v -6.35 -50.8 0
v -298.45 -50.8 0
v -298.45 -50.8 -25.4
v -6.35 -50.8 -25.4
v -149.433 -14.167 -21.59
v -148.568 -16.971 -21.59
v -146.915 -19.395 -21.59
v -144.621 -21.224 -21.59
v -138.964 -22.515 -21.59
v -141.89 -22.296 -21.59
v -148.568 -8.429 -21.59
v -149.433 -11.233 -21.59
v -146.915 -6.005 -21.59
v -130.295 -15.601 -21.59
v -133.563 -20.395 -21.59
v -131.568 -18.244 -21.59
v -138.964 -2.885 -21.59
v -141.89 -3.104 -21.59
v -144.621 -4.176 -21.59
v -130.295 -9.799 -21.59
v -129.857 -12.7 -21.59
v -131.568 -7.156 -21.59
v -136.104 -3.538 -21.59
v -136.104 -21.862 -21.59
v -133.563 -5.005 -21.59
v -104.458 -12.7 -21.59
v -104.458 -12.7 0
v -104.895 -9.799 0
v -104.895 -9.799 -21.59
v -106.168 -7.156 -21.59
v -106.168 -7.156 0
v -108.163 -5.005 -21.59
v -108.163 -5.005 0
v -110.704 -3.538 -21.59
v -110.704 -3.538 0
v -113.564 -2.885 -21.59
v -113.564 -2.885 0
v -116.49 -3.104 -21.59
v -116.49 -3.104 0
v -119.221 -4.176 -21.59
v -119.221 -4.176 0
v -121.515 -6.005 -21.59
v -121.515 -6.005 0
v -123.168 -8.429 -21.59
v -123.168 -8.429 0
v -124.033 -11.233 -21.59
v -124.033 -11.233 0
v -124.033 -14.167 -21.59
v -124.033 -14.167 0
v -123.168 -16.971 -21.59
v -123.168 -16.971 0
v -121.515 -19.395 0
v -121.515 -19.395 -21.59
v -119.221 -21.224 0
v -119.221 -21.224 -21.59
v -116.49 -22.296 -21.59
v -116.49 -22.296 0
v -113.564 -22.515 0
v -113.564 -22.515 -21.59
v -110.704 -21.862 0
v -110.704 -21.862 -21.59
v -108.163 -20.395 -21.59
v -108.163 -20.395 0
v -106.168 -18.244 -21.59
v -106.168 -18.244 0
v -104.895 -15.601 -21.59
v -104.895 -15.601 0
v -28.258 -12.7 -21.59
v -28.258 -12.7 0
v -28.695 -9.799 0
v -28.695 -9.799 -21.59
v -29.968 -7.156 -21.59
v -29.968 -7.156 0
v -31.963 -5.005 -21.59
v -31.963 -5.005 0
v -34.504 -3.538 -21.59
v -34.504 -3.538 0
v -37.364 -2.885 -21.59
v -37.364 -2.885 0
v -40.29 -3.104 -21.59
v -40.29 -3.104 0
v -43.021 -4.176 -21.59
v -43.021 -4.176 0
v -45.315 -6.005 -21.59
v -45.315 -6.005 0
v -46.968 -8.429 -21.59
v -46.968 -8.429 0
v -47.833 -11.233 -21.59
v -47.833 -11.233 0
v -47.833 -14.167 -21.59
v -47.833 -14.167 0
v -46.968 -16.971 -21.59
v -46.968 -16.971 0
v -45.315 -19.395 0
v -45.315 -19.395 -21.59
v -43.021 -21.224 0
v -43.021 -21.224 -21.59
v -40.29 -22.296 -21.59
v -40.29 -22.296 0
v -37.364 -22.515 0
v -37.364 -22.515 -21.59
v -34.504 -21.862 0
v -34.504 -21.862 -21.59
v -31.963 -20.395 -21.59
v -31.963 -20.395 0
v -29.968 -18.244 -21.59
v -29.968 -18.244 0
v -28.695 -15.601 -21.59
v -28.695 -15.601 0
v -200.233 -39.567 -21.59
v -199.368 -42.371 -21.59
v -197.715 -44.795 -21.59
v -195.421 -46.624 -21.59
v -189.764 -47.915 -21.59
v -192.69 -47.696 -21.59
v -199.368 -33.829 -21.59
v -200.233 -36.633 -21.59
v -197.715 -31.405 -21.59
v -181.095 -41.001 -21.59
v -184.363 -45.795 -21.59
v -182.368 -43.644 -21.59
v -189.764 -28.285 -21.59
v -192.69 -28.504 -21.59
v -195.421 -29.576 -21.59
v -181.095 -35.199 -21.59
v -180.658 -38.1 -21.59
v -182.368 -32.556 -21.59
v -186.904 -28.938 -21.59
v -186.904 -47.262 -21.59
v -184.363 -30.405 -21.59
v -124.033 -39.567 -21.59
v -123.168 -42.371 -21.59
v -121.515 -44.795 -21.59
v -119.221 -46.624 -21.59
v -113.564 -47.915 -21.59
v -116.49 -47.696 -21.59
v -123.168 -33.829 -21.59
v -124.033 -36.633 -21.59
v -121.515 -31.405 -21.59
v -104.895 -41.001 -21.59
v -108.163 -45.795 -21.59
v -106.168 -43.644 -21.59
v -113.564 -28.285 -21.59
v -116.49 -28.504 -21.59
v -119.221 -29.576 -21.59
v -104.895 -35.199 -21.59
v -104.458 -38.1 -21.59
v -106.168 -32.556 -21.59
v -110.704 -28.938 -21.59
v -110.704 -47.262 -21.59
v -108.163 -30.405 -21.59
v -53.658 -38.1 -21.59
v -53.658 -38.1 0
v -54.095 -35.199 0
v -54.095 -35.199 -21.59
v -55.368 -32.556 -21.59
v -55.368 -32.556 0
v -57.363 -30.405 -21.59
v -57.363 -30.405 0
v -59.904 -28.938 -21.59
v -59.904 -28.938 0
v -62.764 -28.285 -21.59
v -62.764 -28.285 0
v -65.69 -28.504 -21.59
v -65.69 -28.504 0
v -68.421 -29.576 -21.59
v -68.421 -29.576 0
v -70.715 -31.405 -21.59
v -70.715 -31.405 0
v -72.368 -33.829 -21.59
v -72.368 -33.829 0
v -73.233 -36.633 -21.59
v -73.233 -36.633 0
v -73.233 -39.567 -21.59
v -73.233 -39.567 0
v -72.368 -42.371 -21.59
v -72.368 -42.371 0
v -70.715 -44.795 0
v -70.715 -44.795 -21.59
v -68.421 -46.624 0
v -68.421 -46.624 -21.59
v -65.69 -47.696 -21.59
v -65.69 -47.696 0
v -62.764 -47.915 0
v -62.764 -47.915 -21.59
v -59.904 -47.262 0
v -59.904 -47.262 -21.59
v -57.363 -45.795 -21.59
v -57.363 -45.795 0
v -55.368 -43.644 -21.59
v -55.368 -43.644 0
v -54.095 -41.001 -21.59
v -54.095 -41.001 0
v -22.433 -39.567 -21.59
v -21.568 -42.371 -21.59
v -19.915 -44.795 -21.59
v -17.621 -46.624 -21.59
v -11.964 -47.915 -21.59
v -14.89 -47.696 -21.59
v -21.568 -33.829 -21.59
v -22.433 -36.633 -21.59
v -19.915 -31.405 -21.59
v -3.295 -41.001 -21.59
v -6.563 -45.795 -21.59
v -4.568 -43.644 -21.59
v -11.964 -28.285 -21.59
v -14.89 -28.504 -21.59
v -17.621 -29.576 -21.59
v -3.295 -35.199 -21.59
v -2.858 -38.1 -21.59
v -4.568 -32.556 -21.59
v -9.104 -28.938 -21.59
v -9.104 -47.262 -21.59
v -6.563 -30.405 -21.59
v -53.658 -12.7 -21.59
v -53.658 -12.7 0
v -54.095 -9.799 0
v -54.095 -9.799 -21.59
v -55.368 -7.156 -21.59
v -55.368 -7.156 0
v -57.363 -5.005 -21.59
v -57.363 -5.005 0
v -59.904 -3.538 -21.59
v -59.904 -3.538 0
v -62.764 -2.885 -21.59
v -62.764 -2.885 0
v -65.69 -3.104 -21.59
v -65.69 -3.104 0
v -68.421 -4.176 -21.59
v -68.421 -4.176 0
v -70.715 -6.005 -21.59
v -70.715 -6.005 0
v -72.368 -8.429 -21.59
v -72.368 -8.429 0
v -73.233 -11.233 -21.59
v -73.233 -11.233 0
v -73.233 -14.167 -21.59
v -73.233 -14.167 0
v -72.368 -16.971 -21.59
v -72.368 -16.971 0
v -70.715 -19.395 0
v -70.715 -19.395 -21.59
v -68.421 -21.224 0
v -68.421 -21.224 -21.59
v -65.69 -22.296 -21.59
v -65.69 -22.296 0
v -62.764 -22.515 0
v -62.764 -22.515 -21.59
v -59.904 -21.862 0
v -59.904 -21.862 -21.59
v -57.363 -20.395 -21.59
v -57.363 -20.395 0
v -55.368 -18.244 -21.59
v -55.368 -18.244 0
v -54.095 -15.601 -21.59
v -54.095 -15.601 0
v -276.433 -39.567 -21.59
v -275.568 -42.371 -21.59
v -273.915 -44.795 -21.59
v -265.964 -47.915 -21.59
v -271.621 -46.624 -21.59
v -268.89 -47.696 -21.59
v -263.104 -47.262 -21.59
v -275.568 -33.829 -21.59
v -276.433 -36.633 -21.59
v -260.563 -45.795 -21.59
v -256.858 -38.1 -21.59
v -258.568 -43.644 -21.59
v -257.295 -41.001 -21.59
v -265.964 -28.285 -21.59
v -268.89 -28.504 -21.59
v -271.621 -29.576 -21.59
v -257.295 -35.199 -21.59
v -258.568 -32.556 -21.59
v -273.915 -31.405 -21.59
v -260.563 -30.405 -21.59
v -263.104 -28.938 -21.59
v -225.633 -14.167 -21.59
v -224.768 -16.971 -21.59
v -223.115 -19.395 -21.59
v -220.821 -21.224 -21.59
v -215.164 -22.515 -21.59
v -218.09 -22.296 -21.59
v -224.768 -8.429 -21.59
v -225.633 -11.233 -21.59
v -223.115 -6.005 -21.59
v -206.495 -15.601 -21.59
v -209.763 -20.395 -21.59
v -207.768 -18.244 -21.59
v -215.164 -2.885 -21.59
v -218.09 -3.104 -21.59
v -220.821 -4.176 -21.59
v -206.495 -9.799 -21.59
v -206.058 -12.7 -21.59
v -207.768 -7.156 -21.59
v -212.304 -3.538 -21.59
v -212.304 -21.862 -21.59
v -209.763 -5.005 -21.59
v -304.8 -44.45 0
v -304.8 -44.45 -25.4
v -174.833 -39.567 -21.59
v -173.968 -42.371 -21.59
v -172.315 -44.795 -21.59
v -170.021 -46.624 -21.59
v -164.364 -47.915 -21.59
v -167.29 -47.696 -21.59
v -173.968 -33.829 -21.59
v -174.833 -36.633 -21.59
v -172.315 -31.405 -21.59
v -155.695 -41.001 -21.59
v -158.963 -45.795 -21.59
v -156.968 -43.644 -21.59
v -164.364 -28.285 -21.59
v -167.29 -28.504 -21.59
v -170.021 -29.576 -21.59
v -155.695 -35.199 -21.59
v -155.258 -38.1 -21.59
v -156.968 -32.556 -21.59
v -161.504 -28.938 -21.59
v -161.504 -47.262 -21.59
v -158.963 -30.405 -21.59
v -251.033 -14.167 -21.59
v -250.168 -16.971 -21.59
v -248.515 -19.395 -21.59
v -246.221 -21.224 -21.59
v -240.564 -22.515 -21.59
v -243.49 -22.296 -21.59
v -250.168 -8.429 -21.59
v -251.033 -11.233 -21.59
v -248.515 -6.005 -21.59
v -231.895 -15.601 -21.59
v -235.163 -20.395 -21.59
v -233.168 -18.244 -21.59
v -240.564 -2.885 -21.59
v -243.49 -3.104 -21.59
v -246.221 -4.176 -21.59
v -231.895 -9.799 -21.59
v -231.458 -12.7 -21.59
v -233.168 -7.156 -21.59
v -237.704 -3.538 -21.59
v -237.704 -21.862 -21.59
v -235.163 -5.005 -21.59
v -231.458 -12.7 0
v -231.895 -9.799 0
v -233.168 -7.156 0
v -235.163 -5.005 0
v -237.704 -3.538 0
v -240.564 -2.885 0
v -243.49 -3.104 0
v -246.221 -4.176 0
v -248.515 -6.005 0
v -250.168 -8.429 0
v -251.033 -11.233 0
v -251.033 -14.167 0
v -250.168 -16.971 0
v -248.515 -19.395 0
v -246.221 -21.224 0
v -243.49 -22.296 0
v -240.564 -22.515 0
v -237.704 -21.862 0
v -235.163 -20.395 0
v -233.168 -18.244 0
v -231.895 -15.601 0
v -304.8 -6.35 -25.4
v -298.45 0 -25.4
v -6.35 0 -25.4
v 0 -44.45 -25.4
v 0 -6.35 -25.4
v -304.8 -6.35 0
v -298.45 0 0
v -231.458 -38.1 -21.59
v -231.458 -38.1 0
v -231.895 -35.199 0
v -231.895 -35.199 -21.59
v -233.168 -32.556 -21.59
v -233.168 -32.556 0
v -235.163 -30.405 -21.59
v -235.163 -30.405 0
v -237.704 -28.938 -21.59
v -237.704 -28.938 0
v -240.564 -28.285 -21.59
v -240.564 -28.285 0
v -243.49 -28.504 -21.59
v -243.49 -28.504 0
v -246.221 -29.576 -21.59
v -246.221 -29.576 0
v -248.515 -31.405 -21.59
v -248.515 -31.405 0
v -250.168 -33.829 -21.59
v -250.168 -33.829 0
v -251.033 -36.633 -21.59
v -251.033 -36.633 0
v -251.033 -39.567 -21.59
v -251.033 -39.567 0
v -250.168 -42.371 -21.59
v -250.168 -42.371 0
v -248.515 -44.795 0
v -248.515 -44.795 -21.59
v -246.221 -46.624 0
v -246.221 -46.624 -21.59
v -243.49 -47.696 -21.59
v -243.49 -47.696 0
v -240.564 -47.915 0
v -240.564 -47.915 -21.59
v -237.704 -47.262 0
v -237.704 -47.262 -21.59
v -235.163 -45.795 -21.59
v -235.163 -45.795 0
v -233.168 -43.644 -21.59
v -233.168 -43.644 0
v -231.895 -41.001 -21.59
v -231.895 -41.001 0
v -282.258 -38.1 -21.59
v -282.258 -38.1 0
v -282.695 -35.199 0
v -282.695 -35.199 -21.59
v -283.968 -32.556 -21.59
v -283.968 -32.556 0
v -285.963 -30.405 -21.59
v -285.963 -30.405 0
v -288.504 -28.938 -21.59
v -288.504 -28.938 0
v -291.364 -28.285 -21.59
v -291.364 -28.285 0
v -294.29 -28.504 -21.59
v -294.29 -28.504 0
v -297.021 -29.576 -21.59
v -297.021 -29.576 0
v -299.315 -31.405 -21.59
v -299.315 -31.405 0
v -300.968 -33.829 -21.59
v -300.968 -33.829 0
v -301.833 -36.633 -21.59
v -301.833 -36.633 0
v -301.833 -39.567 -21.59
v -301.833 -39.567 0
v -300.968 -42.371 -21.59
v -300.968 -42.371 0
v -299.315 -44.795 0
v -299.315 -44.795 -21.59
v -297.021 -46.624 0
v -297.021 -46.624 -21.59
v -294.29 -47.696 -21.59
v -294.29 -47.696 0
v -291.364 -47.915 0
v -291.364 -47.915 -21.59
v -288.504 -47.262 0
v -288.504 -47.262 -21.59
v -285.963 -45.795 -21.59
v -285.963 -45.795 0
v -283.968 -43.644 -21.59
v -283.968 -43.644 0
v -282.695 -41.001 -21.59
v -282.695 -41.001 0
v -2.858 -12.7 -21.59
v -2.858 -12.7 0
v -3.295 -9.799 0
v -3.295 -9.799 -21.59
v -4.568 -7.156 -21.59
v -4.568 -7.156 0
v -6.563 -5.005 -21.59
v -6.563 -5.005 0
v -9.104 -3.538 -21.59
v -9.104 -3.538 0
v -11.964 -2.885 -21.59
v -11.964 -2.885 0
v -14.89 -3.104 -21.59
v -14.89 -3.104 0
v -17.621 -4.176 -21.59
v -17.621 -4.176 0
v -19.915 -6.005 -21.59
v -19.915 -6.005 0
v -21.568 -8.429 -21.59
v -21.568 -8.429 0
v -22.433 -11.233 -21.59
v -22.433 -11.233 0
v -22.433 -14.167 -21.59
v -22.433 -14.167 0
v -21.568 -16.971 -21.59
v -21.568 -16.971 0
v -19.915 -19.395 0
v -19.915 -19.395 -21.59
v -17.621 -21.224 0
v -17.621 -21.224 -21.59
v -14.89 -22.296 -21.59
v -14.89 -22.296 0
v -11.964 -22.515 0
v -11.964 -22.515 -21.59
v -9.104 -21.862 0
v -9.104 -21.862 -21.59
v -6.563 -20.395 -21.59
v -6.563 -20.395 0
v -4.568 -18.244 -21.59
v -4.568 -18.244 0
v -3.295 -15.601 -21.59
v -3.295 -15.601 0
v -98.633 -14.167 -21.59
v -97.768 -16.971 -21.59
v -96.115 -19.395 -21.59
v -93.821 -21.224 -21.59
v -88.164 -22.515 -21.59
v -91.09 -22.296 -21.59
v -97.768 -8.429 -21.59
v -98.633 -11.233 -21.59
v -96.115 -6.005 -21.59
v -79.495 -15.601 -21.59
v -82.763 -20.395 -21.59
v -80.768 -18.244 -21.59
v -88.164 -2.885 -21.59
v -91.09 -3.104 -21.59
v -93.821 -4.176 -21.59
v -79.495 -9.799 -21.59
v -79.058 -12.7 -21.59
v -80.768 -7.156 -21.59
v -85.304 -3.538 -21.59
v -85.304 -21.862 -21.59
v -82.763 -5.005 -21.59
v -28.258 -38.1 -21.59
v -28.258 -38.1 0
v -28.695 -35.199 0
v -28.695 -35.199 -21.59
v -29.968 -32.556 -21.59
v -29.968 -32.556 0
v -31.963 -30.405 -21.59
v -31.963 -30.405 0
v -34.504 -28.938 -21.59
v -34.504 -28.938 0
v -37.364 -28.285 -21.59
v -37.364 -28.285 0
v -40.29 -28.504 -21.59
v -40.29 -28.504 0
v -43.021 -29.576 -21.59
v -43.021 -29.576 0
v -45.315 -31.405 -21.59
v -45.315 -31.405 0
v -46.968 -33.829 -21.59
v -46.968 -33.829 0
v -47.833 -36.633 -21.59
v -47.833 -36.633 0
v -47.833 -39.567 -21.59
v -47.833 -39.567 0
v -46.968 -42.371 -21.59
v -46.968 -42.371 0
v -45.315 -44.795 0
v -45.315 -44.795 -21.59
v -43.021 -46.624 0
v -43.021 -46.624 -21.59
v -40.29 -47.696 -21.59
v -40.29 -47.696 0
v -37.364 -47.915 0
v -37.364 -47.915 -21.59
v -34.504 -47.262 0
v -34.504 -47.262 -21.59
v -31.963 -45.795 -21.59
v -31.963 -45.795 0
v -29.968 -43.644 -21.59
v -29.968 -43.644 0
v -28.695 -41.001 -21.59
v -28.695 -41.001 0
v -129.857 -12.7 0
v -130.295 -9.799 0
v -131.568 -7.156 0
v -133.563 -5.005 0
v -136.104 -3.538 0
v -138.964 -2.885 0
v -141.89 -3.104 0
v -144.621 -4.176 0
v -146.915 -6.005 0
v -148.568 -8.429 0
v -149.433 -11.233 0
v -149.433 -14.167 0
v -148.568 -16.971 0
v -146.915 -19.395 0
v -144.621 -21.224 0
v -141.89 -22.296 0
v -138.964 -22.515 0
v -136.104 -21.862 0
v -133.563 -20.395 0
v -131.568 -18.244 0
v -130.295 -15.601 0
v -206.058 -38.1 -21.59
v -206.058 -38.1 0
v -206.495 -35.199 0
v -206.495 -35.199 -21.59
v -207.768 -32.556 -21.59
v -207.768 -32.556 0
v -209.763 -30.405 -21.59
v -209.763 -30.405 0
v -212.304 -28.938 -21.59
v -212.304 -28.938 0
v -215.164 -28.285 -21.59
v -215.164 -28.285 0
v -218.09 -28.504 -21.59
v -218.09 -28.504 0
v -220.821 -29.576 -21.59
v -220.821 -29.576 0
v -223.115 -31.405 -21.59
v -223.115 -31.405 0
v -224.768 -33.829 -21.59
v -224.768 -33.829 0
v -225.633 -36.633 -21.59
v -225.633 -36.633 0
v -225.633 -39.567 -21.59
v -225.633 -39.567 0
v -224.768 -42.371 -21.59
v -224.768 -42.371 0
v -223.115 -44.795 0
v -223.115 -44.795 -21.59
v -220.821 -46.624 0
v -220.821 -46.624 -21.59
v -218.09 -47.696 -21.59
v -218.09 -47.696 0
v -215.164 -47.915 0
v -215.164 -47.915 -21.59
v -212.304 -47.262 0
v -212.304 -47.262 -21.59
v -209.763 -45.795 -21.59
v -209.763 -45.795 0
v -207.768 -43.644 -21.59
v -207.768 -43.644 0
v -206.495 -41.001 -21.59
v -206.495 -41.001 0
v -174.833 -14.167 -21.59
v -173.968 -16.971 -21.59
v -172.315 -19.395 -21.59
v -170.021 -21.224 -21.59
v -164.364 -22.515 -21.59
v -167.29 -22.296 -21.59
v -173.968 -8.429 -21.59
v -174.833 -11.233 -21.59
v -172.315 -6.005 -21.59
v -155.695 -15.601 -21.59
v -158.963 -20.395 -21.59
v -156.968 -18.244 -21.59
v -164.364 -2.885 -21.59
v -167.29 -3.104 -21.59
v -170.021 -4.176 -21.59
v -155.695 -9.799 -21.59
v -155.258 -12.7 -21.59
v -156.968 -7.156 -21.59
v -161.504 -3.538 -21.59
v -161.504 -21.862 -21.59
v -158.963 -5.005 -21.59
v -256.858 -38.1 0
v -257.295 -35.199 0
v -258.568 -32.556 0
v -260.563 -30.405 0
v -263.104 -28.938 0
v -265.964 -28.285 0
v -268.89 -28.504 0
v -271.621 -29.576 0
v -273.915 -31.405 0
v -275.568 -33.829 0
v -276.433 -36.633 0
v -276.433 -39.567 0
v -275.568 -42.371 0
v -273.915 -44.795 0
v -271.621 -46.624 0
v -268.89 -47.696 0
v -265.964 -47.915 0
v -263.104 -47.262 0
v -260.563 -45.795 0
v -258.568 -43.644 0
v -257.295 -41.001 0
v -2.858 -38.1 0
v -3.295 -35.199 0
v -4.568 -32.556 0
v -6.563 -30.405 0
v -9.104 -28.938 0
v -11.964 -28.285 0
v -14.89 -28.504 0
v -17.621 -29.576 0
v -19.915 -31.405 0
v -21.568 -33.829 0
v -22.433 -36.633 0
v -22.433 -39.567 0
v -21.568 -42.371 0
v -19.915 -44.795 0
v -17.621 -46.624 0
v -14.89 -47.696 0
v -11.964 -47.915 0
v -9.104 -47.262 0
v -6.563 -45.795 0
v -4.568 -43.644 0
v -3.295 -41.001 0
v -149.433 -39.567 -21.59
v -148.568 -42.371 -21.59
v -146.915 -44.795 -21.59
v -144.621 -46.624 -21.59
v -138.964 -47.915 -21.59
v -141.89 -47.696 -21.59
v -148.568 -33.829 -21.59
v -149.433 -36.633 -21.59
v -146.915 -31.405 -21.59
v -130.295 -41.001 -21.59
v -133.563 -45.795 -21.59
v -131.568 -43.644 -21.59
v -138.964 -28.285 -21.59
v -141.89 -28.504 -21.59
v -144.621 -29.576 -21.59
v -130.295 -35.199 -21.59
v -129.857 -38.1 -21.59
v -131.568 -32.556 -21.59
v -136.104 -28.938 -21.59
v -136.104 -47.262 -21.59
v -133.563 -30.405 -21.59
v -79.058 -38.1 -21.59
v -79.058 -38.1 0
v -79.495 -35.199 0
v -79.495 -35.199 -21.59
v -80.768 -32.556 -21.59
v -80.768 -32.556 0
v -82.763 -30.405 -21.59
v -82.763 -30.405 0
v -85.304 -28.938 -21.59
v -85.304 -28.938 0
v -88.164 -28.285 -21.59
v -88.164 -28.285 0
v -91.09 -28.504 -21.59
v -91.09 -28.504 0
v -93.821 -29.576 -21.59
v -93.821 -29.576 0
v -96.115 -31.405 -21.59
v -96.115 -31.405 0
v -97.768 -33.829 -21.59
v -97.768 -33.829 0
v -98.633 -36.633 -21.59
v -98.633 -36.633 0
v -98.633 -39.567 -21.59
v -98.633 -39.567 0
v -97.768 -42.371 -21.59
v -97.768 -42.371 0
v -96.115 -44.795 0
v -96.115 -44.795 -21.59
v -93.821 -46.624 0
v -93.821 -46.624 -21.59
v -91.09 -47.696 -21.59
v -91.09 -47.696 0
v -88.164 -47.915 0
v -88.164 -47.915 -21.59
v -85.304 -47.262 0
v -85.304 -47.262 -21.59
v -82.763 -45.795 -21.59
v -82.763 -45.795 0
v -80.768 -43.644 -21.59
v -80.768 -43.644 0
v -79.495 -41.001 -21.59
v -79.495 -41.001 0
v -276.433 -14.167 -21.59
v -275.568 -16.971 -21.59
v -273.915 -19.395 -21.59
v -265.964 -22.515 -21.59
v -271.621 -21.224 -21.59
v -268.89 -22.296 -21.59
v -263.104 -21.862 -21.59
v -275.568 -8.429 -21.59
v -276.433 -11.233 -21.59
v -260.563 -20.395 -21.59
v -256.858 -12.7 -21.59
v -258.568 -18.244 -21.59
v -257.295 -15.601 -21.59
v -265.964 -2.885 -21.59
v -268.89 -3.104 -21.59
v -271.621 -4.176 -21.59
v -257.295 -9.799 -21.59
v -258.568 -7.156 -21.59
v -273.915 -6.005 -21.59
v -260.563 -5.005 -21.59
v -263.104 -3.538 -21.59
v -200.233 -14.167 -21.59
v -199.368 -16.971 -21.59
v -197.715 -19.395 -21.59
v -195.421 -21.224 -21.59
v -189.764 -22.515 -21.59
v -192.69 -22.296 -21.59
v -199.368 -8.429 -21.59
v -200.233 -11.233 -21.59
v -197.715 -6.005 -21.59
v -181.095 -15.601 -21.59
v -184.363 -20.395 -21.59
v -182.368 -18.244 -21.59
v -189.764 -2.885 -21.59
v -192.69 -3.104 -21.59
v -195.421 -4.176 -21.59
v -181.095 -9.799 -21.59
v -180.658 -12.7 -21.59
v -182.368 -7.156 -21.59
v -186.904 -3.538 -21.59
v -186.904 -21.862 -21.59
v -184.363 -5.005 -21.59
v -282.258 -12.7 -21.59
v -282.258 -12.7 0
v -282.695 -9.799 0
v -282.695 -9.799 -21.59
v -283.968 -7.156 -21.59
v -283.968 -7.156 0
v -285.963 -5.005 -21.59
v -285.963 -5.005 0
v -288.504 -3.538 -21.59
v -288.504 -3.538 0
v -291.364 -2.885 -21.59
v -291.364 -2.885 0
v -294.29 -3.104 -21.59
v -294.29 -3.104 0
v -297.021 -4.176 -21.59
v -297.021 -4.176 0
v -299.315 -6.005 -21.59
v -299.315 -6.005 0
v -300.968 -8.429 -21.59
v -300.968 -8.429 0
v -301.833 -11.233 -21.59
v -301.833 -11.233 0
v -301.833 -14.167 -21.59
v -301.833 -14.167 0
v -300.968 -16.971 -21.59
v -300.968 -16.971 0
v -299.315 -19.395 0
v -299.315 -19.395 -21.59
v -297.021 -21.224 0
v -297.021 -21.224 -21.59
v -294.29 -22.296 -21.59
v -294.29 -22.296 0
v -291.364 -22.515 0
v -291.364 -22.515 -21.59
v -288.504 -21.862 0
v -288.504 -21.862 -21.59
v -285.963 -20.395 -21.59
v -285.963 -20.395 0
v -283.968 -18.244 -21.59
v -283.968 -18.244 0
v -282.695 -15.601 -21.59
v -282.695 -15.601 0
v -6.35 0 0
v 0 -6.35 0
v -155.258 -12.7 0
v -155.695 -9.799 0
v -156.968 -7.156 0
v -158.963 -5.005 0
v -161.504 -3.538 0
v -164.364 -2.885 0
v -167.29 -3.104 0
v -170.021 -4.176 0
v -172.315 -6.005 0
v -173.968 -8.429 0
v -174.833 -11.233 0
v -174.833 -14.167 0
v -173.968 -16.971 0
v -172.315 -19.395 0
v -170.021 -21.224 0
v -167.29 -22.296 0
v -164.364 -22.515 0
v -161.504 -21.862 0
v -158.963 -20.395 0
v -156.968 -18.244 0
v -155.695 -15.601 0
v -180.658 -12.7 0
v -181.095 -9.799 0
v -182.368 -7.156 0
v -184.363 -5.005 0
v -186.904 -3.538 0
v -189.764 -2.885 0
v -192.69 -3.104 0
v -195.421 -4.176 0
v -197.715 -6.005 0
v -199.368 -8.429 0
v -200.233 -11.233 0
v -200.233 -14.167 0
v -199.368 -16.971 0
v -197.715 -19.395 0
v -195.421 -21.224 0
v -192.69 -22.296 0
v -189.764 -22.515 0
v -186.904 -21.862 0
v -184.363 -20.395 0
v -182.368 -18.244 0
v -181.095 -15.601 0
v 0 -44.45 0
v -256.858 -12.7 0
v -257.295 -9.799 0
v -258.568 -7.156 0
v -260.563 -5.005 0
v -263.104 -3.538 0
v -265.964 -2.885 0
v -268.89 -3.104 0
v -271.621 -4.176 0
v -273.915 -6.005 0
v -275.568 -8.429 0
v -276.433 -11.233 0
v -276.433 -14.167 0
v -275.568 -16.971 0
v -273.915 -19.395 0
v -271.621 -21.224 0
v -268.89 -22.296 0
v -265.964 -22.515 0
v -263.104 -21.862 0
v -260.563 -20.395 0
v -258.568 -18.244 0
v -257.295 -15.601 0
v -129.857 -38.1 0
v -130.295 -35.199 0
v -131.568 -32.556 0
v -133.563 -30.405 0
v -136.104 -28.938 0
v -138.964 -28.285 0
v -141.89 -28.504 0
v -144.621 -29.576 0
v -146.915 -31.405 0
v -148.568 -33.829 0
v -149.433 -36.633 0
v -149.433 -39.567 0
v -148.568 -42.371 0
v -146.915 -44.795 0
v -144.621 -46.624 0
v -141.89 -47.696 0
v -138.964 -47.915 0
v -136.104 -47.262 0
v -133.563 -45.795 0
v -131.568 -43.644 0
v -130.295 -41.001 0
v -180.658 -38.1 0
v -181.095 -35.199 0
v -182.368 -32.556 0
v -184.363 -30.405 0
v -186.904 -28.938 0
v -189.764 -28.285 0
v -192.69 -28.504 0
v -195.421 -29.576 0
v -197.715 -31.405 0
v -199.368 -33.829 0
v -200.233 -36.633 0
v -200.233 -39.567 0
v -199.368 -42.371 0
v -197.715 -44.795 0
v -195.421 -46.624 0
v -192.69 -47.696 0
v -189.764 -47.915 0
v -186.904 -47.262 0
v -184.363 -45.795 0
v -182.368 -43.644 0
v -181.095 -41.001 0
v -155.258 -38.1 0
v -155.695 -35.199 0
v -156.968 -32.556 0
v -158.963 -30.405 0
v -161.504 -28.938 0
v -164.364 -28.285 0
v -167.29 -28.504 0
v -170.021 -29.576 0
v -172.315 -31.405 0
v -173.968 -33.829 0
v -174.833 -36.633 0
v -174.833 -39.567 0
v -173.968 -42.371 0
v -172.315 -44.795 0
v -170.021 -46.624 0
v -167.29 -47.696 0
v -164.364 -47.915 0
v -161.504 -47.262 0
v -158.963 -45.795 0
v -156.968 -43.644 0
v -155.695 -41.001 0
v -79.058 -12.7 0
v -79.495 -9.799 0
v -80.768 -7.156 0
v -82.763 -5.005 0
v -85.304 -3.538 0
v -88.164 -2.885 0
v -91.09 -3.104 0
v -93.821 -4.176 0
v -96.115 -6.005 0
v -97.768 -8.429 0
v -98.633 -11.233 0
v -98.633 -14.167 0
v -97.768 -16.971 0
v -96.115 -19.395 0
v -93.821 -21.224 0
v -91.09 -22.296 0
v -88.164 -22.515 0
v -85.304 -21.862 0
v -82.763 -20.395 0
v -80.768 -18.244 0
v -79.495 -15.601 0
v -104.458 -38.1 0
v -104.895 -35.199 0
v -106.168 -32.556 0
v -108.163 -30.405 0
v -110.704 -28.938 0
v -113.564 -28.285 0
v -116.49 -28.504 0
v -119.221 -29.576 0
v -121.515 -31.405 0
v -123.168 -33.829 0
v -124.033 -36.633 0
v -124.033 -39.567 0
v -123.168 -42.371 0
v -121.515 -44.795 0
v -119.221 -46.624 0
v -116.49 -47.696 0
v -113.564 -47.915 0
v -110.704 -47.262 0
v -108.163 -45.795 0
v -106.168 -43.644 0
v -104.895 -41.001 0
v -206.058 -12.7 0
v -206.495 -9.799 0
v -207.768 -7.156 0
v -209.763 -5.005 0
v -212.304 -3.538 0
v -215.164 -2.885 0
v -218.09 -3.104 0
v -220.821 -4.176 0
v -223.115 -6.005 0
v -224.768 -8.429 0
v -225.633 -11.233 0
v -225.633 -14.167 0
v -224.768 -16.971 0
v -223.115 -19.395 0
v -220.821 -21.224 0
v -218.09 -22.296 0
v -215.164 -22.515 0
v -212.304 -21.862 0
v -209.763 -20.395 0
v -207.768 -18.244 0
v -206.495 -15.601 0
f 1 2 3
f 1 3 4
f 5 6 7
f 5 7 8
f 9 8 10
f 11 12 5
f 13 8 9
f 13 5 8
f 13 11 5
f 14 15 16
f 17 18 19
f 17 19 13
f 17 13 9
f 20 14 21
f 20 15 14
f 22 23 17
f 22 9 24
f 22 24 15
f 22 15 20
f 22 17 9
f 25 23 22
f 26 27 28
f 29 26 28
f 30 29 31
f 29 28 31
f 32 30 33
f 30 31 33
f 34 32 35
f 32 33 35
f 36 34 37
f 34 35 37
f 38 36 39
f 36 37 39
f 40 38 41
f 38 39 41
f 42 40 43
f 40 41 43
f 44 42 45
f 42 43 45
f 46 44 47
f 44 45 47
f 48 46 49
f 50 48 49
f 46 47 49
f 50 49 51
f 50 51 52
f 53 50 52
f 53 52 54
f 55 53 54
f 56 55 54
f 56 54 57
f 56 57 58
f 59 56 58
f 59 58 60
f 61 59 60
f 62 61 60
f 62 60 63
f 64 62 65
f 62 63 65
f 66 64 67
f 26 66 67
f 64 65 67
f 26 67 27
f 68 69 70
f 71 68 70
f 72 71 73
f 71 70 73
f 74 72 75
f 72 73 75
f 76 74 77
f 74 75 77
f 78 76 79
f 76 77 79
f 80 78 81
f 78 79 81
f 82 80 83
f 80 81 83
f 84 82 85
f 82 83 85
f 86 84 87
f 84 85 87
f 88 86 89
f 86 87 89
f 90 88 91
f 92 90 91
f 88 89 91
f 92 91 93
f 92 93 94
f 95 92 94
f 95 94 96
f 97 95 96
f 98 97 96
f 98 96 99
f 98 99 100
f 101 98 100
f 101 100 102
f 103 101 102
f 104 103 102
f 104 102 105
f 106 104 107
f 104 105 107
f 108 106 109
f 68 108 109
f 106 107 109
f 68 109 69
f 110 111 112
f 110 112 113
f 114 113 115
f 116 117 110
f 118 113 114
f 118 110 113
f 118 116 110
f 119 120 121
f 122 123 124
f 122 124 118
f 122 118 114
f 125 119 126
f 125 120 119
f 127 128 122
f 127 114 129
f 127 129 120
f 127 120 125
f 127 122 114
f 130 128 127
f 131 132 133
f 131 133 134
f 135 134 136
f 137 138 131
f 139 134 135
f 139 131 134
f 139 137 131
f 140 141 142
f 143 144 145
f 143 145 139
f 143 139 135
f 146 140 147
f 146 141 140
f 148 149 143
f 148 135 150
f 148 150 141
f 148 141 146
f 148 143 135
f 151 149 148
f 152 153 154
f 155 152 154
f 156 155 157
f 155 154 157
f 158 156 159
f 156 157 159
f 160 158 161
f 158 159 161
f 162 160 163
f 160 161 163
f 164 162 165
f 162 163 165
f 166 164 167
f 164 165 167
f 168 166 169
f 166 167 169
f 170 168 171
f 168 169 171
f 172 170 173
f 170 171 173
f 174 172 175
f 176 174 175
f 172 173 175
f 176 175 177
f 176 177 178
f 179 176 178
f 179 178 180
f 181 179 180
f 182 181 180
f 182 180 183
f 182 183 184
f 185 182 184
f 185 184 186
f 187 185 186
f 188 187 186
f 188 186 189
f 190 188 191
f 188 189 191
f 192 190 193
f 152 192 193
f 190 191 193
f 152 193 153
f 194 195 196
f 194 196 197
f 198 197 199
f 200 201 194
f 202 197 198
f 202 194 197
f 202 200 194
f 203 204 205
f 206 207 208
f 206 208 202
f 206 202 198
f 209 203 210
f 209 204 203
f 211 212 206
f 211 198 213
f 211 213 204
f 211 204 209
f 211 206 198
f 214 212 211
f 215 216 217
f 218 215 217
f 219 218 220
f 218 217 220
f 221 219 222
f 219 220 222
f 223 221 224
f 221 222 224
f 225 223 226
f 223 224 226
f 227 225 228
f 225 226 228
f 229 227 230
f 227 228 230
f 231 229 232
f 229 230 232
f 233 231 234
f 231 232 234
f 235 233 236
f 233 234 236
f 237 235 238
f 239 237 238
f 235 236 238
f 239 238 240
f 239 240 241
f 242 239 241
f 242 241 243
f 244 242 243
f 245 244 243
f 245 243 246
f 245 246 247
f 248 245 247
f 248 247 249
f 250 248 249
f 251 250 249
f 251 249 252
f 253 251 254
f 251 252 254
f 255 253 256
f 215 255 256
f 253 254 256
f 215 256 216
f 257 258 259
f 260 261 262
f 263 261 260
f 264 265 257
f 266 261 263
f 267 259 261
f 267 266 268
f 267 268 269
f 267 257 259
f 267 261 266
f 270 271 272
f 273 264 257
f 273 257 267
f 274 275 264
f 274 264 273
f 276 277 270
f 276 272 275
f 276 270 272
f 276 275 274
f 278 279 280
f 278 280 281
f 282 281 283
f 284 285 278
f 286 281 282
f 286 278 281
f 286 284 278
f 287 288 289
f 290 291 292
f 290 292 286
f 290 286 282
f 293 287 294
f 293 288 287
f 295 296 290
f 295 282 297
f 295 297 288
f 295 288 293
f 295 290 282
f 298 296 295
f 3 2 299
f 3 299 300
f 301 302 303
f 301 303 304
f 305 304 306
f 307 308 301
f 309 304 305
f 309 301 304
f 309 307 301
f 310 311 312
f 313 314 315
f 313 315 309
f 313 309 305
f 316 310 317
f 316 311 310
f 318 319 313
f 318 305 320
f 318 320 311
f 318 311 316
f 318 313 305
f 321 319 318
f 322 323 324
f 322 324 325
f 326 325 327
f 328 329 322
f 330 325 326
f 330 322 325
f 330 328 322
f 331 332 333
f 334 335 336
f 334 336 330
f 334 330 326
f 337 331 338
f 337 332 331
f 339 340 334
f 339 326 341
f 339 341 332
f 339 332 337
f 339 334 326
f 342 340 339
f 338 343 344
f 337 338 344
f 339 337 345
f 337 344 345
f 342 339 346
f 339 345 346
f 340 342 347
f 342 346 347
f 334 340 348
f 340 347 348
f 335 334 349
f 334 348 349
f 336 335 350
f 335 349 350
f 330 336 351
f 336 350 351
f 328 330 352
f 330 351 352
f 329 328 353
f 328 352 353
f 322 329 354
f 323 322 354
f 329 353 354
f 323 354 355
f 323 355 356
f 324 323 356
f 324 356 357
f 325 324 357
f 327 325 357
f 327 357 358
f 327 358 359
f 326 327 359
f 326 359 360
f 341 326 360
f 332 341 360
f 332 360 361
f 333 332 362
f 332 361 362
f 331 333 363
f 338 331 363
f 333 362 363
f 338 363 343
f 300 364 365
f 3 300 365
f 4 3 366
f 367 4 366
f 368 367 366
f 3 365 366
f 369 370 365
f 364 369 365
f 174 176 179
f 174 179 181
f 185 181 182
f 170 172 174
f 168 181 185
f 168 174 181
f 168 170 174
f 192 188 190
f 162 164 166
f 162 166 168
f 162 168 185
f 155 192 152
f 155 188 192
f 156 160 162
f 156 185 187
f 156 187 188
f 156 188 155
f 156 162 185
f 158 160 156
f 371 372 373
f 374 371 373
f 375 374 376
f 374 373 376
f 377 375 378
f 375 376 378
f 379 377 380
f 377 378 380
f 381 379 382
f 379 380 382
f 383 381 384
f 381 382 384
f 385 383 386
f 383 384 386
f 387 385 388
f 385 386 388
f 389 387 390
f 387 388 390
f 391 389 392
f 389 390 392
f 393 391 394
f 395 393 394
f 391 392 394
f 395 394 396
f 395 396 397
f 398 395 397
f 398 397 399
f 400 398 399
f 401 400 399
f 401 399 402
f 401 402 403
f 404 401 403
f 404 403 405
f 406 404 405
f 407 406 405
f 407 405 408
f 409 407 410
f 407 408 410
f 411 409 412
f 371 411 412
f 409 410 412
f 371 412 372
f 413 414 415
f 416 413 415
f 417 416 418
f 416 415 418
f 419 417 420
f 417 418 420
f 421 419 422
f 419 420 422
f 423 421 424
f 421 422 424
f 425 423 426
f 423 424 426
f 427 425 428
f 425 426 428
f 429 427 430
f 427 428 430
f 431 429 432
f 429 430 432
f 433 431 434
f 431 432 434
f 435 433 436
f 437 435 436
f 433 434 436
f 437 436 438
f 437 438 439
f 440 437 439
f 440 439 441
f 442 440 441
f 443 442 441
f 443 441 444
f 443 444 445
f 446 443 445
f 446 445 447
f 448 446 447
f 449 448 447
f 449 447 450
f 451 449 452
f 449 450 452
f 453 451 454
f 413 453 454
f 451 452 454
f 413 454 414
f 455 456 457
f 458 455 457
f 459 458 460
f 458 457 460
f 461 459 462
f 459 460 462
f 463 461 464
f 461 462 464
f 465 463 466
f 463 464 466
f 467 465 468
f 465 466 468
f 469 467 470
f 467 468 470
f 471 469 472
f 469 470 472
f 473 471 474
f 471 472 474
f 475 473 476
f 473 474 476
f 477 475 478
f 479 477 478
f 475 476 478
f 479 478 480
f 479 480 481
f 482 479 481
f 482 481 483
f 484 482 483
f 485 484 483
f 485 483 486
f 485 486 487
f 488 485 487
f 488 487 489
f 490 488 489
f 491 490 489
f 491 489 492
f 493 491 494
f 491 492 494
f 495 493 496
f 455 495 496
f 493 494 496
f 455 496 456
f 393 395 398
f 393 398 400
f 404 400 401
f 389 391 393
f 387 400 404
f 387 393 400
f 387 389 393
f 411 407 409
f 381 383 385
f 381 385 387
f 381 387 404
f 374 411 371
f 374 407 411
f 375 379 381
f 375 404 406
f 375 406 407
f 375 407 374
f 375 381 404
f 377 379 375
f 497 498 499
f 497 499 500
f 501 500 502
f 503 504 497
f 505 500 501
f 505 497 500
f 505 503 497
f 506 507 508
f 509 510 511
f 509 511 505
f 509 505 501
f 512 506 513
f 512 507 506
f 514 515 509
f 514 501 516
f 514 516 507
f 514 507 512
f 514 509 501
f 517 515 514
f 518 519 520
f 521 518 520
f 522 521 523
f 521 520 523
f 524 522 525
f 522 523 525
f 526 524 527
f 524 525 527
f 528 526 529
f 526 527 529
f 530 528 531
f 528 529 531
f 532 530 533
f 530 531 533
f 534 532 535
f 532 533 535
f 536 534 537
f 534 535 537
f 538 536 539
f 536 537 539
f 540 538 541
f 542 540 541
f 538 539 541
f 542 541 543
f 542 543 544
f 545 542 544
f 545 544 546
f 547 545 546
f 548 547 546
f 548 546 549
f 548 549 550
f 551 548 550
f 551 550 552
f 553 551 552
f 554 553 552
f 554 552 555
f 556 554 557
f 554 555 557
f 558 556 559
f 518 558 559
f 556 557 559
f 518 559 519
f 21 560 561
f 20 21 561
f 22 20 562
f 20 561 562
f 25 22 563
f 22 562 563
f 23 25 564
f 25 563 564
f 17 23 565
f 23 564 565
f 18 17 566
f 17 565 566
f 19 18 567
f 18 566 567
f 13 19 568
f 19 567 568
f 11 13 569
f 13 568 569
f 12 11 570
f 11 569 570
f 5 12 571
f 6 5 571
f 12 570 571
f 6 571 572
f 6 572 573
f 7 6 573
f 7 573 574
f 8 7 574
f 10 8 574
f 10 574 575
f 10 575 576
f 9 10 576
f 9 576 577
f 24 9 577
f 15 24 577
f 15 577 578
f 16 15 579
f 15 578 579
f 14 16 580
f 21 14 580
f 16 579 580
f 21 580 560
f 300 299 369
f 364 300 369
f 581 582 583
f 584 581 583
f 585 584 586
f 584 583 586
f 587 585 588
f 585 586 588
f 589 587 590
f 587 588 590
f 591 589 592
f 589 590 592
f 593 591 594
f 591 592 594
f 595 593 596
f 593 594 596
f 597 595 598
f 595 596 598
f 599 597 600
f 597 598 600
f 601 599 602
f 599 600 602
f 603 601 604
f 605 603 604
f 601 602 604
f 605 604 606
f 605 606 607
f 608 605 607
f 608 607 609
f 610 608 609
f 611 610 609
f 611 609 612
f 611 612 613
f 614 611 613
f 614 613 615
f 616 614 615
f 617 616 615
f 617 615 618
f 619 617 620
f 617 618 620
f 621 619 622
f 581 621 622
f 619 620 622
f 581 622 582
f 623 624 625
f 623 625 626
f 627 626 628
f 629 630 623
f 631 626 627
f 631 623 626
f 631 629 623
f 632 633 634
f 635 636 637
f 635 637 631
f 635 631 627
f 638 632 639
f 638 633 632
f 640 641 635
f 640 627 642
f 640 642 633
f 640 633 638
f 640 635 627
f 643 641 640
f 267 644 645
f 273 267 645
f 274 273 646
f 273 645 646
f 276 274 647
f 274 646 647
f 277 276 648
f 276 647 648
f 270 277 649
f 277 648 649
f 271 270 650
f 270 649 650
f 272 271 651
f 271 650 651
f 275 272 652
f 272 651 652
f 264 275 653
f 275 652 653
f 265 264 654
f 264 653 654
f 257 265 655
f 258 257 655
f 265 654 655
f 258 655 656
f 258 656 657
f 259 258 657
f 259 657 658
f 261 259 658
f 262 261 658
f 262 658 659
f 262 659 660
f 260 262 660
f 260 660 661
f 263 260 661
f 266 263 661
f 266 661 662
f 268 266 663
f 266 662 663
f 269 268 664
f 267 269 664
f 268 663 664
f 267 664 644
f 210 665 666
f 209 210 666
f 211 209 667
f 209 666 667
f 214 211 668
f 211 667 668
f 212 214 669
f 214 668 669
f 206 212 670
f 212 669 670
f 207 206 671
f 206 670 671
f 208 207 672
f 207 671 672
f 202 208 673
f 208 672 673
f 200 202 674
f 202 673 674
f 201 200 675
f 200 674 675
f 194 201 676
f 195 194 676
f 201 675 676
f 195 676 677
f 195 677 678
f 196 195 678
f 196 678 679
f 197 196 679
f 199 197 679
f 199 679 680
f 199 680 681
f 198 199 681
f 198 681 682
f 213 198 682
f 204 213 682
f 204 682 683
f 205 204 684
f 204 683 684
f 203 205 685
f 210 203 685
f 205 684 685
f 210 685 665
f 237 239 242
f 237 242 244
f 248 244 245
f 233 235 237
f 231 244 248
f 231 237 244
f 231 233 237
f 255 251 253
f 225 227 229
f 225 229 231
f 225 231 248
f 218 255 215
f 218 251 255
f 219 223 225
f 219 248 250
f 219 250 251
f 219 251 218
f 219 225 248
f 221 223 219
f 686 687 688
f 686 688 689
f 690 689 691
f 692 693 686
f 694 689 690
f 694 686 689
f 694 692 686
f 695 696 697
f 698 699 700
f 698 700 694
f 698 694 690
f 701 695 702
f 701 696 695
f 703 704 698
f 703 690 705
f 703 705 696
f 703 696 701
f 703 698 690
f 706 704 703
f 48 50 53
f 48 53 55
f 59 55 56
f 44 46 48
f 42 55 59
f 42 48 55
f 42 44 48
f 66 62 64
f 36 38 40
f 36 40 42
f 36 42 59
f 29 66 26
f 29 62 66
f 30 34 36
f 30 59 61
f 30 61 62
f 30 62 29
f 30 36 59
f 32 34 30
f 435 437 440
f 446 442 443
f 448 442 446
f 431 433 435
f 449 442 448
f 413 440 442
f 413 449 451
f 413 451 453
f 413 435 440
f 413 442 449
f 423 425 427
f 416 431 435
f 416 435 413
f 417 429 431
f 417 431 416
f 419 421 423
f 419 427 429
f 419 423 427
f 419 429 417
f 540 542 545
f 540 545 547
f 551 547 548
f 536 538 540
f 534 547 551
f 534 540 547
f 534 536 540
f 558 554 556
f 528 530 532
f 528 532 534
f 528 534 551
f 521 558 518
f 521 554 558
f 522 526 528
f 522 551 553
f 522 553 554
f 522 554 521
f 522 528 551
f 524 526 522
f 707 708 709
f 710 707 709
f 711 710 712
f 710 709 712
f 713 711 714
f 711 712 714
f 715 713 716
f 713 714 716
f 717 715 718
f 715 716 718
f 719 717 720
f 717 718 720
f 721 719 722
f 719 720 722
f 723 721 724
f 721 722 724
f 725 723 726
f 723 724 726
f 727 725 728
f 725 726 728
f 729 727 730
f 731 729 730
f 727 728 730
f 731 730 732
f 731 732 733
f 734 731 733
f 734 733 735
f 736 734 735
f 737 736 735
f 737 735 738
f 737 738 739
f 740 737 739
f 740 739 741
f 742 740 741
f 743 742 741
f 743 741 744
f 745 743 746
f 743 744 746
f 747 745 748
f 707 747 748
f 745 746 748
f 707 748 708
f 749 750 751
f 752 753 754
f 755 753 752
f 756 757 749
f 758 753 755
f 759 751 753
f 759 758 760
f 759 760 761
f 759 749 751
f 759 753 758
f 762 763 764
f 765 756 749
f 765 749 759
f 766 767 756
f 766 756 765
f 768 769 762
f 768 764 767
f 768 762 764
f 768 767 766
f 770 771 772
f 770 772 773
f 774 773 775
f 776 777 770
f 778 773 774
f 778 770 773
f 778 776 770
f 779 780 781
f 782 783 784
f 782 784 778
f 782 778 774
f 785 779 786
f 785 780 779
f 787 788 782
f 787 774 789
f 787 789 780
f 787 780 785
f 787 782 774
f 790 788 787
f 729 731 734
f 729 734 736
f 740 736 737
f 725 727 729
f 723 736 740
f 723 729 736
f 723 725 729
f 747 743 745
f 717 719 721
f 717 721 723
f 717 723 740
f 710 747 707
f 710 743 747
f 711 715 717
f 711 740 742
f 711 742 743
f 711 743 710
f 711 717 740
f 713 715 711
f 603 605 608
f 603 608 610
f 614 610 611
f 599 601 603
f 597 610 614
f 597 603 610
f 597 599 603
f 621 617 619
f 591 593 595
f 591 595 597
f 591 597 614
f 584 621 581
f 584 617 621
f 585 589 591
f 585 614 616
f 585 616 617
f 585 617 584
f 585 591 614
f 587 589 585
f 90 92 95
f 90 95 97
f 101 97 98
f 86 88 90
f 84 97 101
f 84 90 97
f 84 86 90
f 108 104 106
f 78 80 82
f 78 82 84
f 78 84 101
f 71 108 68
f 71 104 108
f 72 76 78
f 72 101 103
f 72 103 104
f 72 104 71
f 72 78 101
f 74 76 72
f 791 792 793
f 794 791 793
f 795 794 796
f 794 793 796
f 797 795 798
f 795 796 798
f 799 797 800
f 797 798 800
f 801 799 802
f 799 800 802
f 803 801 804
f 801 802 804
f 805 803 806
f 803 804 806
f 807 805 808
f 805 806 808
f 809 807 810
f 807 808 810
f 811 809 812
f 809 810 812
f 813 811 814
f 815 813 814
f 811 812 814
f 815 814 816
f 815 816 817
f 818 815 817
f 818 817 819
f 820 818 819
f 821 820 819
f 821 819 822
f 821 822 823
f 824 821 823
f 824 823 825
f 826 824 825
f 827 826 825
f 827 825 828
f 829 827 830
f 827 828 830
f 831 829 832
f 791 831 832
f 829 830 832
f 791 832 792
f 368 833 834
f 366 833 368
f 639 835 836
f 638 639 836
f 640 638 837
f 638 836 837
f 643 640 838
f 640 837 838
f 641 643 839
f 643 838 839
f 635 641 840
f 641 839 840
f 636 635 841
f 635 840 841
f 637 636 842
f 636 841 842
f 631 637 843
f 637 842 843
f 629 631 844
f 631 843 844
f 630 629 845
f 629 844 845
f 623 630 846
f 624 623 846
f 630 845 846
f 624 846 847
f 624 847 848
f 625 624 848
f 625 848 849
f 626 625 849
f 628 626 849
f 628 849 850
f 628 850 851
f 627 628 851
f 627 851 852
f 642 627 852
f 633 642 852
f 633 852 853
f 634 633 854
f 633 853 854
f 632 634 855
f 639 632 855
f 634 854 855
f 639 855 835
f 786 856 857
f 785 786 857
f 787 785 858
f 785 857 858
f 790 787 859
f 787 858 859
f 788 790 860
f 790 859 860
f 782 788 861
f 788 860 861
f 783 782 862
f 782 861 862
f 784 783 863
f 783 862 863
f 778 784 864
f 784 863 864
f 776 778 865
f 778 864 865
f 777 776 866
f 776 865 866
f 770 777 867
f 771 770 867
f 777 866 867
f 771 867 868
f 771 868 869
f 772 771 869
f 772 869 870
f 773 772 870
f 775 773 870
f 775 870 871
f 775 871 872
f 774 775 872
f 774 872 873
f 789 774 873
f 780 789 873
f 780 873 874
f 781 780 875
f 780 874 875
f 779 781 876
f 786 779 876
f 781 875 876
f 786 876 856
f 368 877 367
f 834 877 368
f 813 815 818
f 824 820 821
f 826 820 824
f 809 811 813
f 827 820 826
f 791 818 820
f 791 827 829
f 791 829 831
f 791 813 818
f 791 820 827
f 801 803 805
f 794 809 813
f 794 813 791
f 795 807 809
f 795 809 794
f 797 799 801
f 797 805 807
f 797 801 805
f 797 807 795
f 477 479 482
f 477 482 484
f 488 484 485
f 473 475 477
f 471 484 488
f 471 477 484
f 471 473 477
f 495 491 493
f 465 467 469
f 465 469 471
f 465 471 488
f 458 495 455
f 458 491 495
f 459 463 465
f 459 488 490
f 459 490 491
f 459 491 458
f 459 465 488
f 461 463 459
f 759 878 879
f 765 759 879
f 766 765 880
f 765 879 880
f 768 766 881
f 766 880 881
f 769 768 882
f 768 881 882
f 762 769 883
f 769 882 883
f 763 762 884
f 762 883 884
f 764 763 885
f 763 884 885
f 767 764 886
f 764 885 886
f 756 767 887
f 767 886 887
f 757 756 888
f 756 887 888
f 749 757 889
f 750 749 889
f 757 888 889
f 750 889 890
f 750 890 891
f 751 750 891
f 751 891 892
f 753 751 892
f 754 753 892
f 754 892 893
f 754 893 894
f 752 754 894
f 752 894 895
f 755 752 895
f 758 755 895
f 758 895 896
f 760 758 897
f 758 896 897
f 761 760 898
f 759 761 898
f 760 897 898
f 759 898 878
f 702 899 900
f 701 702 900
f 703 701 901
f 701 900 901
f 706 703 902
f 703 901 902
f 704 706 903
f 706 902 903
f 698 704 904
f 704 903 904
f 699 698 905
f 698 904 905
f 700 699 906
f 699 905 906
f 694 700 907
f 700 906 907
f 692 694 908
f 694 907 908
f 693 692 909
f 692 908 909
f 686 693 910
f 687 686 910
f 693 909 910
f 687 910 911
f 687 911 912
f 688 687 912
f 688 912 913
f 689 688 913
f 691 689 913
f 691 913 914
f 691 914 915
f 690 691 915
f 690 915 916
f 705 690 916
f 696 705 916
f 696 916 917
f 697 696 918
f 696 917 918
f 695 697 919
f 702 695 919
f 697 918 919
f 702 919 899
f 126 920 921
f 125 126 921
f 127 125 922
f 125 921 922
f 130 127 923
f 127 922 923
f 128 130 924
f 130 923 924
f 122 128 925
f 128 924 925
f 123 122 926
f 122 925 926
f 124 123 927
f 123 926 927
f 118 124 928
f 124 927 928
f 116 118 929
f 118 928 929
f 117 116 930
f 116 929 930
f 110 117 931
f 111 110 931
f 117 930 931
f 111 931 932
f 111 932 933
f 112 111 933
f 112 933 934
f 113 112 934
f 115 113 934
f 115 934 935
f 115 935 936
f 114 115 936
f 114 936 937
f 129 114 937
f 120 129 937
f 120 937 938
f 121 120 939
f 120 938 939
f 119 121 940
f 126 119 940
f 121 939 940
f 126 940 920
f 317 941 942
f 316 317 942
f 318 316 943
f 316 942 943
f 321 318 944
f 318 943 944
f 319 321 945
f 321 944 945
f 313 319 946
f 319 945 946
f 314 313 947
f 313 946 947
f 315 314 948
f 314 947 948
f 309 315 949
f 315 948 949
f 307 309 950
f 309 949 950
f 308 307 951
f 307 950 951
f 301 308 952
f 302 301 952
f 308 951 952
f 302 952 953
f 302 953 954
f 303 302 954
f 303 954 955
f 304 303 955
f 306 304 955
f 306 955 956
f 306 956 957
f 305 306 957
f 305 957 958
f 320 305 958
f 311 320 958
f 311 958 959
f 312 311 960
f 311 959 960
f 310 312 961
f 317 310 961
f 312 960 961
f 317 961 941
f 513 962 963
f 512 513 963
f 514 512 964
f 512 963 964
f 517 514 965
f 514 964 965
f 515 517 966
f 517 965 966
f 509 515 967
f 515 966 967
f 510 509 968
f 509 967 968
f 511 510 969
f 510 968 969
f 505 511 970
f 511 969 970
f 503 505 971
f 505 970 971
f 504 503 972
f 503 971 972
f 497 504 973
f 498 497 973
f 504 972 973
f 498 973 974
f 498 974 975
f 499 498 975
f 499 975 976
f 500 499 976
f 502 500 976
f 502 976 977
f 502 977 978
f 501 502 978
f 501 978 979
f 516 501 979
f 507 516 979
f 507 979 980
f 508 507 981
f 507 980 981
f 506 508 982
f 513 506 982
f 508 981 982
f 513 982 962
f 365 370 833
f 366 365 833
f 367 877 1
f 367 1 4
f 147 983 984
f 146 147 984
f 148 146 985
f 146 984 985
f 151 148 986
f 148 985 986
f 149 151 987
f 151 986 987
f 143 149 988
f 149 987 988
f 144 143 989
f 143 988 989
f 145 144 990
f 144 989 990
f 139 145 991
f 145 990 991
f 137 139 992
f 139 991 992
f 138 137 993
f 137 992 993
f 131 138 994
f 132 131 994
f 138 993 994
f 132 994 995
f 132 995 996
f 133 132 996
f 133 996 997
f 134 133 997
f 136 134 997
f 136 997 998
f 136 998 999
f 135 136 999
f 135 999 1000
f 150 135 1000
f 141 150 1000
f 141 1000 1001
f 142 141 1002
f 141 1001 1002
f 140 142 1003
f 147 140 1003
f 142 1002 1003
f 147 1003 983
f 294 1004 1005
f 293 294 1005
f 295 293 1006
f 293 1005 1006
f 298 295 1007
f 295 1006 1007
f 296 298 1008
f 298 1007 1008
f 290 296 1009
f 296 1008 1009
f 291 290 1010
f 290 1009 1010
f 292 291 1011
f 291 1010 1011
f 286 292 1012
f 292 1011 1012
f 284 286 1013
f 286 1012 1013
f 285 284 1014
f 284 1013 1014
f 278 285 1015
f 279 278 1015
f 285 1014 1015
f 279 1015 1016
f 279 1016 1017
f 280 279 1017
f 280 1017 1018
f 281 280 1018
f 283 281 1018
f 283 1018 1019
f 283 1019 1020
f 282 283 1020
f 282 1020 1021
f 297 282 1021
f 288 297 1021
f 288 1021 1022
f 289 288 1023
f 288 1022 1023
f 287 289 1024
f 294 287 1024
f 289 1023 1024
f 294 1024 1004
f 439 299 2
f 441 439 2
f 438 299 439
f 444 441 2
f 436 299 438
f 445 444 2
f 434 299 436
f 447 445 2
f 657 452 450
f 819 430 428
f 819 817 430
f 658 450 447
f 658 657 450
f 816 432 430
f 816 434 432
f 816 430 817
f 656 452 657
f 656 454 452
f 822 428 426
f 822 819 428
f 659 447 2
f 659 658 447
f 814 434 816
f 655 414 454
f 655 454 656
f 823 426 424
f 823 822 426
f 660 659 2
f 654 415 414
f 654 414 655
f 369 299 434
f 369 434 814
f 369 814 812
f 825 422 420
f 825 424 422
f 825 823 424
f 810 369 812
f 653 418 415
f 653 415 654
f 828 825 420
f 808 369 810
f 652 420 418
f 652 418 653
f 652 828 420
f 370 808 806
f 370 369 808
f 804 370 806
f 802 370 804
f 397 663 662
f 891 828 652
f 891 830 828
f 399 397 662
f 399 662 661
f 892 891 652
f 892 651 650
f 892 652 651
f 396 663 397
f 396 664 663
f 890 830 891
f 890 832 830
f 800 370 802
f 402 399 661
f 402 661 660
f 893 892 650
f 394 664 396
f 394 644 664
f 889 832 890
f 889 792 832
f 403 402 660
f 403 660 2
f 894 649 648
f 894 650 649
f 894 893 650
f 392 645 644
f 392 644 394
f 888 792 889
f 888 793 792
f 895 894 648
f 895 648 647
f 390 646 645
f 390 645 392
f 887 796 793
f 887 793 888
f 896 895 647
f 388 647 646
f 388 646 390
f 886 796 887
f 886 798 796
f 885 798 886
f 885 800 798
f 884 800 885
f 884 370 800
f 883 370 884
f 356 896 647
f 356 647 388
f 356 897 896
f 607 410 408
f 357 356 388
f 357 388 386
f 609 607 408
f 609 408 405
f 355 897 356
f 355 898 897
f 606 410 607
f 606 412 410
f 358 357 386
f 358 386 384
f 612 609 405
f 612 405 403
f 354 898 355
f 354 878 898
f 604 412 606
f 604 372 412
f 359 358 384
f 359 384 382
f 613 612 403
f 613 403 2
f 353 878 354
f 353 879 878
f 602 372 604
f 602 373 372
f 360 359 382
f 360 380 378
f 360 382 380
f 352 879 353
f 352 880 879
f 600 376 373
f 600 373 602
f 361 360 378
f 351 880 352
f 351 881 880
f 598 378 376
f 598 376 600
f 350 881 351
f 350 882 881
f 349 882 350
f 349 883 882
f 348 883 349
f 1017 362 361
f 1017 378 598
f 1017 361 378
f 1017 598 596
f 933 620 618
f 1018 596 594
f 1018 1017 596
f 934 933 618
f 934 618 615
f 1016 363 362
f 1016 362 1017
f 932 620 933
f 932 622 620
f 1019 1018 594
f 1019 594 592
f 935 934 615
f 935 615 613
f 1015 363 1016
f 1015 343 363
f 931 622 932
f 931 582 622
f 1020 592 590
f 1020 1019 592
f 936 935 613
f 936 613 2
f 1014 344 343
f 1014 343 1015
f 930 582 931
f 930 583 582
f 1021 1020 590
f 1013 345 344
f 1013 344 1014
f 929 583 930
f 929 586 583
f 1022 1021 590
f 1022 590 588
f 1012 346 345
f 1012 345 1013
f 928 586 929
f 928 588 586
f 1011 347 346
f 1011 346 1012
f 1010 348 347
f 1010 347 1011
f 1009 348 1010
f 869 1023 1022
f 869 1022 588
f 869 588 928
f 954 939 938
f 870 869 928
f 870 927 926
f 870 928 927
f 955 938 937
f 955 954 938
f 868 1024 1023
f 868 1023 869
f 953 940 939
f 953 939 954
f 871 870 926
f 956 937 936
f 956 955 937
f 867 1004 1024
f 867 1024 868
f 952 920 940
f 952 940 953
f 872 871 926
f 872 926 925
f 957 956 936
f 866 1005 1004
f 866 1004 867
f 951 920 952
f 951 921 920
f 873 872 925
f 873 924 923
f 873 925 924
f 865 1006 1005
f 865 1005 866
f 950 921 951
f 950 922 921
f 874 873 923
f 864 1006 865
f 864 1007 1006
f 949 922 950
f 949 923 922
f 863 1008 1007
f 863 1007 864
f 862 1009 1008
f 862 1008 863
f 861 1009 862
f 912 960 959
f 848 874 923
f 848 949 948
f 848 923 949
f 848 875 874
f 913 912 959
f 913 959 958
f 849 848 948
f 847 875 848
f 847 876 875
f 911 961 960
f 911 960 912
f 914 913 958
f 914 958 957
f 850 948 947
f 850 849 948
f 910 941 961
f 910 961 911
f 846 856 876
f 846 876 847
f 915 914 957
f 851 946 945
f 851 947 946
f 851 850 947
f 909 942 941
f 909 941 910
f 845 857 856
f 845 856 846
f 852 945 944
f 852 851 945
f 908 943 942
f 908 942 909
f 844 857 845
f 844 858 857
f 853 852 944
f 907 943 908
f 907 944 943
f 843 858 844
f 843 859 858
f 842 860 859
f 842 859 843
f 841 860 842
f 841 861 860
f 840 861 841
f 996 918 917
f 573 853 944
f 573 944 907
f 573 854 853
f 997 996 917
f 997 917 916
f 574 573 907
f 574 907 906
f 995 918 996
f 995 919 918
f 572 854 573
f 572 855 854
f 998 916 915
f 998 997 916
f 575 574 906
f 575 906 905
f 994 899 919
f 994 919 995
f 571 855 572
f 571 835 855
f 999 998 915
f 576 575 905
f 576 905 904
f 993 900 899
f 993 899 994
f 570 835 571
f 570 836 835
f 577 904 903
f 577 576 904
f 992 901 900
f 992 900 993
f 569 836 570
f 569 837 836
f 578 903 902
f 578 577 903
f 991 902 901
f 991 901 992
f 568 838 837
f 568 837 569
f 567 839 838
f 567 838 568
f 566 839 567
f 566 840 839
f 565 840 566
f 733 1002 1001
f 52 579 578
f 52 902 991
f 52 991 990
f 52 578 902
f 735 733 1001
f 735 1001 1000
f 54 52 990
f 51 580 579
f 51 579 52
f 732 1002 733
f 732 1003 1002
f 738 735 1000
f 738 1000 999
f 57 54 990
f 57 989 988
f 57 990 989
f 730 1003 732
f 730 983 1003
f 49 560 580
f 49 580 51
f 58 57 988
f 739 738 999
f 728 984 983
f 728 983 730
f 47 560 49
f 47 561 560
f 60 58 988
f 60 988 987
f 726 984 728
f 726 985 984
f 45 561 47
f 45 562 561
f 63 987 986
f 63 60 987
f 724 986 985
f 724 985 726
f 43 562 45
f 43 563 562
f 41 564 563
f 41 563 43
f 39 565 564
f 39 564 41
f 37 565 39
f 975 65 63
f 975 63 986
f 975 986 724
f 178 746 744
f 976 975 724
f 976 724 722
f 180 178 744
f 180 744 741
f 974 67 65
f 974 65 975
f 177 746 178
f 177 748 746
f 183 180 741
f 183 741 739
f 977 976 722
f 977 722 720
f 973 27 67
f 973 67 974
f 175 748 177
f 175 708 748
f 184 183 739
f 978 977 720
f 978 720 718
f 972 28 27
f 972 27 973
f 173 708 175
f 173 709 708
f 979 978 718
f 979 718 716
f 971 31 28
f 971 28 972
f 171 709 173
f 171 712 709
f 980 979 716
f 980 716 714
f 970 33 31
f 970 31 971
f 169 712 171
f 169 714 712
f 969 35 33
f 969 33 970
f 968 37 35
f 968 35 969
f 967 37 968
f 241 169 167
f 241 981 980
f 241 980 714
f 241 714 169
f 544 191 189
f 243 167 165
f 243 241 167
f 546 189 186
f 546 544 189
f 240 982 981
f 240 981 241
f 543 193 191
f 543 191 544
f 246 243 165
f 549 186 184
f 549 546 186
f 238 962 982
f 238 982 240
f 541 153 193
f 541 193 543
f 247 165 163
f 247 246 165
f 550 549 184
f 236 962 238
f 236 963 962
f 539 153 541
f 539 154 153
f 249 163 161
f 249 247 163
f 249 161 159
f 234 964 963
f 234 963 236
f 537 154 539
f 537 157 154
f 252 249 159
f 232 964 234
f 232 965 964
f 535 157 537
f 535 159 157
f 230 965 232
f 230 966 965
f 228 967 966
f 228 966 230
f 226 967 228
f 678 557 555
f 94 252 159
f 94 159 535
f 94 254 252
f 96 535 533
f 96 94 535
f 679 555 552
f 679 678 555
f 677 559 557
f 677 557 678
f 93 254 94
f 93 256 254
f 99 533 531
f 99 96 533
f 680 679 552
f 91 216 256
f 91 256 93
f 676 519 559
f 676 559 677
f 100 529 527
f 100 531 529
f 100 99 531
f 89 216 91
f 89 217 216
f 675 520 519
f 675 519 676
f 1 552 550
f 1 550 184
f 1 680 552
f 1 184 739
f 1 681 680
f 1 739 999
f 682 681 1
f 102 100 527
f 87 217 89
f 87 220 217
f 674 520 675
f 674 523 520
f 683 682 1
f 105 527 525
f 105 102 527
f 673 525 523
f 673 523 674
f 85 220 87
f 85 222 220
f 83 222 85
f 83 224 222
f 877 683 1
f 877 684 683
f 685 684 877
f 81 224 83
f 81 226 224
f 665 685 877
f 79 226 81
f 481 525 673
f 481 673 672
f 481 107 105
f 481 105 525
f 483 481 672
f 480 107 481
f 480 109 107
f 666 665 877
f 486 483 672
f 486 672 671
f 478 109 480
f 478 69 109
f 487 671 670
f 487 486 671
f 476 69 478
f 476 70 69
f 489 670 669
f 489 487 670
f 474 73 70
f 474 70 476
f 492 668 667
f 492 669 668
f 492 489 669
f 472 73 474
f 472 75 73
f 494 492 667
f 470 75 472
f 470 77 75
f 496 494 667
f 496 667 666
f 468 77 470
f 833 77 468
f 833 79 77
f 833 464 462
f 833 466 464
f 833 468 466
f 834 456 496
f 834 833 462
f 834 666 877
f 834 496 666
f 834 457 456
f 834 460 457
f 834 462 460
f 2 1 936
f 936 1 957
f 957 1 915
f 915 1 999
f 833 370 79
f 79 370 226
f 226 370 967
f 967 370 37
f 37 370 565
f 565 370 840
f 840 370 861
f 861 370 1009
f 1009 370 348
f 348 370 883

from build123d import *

# Parameters (mm, degrees)
F0_W     = 304.8
F0_H     = 50.8
F1_DEPTH = 25.4
F2_SIZE  = 6.35
F3_R     = 9.8425
F4_DEPTH = 21.59


with BuildPart() as f1:
    # F0 (on Top) → F1 (new body)
    with BuildSketch(Plane.XY):
        with Locations((-152.4, -25.4)):
            Rectangle(F0_W, F0_H)
    extrude(amount=-F1_DEPTH)

    # F2
    f2_edges = [f1.edges().sort_by_distance(p)[0] for p in [
        (0, 0, -12.7),
        (0, -50.8, -12.7),
        (-304.8, -50.8, -12.7),
        (-304.8, 0, -12.7),
    ]]
    chamfer(f2_edges, length=F2_SIZE)

    # F3 (on face) → F4 (cut)
    with BuildSketch(Plane.XY):
        with Locations((-12.7, -12.7)):
            Circle(F3_R)
        with Locations((-12.7, -38.1)):
            Circle(F3_R)
        with Locations((-38.1, -12.7)):
            Circle(F3_R)
        with Locations((-38.1, -38.1)):
            Circle(F3_R)
        with Locations((-63.5, -12.7)):
            Circle(F3_R)
        with Locations((-63.5, -38.1)):
            Circle(F3_R)
        with Locations((-88.9, -12.7)):
            Circle(F3_R)
        with Locations((-88.9, -38.1)):
            Circle(F3_R)
        with Locations((-114.3, -12.7)):
            Circle(F3_R)
        with Locations((-114.3, -38.1)):
            Circle(F3_R)
        with Locations((-139.7, -12.7)):
            Circle(F3_R)
        with Locations((-139.7, -38.1)):
            Circle(F3_R)
        with Locations((-165.1, -12.7)):
            Circle(F3_R)
        with Locations((-165.1, -38.1)):
            Circle(F3_R)
        with Locations((-190.5, -12.7)):
            Circle(F3_R)
        with Locations((-190.5, -38.1)):
            Circle(F3_R)
        with Locations((-215.9, -12.7)):
            Circle(F3_R)
        with Locations((-215.9, -38.1)):
            Circle(F3_R)
        with Locations((-241.3, -12.7)):
            Circle(F3_R)
        with Locations((-241.3, -38.1)):
            Circle(F3_R)
        with Locations((-266.7, -12.7)):
            Circle(F3_R)
        with Locations((-266.7, -38.1)):
            Circle(F3_R)
        with Locations((-292.1, -12.7)):
            Circle(F3_R)
        with Locations((-292.1, -38.1)):
            Circle(F3_R)
    extrude(amount=-F4_DEPTH, mode=Mode.SUBTRACT)


solid = f1.part
